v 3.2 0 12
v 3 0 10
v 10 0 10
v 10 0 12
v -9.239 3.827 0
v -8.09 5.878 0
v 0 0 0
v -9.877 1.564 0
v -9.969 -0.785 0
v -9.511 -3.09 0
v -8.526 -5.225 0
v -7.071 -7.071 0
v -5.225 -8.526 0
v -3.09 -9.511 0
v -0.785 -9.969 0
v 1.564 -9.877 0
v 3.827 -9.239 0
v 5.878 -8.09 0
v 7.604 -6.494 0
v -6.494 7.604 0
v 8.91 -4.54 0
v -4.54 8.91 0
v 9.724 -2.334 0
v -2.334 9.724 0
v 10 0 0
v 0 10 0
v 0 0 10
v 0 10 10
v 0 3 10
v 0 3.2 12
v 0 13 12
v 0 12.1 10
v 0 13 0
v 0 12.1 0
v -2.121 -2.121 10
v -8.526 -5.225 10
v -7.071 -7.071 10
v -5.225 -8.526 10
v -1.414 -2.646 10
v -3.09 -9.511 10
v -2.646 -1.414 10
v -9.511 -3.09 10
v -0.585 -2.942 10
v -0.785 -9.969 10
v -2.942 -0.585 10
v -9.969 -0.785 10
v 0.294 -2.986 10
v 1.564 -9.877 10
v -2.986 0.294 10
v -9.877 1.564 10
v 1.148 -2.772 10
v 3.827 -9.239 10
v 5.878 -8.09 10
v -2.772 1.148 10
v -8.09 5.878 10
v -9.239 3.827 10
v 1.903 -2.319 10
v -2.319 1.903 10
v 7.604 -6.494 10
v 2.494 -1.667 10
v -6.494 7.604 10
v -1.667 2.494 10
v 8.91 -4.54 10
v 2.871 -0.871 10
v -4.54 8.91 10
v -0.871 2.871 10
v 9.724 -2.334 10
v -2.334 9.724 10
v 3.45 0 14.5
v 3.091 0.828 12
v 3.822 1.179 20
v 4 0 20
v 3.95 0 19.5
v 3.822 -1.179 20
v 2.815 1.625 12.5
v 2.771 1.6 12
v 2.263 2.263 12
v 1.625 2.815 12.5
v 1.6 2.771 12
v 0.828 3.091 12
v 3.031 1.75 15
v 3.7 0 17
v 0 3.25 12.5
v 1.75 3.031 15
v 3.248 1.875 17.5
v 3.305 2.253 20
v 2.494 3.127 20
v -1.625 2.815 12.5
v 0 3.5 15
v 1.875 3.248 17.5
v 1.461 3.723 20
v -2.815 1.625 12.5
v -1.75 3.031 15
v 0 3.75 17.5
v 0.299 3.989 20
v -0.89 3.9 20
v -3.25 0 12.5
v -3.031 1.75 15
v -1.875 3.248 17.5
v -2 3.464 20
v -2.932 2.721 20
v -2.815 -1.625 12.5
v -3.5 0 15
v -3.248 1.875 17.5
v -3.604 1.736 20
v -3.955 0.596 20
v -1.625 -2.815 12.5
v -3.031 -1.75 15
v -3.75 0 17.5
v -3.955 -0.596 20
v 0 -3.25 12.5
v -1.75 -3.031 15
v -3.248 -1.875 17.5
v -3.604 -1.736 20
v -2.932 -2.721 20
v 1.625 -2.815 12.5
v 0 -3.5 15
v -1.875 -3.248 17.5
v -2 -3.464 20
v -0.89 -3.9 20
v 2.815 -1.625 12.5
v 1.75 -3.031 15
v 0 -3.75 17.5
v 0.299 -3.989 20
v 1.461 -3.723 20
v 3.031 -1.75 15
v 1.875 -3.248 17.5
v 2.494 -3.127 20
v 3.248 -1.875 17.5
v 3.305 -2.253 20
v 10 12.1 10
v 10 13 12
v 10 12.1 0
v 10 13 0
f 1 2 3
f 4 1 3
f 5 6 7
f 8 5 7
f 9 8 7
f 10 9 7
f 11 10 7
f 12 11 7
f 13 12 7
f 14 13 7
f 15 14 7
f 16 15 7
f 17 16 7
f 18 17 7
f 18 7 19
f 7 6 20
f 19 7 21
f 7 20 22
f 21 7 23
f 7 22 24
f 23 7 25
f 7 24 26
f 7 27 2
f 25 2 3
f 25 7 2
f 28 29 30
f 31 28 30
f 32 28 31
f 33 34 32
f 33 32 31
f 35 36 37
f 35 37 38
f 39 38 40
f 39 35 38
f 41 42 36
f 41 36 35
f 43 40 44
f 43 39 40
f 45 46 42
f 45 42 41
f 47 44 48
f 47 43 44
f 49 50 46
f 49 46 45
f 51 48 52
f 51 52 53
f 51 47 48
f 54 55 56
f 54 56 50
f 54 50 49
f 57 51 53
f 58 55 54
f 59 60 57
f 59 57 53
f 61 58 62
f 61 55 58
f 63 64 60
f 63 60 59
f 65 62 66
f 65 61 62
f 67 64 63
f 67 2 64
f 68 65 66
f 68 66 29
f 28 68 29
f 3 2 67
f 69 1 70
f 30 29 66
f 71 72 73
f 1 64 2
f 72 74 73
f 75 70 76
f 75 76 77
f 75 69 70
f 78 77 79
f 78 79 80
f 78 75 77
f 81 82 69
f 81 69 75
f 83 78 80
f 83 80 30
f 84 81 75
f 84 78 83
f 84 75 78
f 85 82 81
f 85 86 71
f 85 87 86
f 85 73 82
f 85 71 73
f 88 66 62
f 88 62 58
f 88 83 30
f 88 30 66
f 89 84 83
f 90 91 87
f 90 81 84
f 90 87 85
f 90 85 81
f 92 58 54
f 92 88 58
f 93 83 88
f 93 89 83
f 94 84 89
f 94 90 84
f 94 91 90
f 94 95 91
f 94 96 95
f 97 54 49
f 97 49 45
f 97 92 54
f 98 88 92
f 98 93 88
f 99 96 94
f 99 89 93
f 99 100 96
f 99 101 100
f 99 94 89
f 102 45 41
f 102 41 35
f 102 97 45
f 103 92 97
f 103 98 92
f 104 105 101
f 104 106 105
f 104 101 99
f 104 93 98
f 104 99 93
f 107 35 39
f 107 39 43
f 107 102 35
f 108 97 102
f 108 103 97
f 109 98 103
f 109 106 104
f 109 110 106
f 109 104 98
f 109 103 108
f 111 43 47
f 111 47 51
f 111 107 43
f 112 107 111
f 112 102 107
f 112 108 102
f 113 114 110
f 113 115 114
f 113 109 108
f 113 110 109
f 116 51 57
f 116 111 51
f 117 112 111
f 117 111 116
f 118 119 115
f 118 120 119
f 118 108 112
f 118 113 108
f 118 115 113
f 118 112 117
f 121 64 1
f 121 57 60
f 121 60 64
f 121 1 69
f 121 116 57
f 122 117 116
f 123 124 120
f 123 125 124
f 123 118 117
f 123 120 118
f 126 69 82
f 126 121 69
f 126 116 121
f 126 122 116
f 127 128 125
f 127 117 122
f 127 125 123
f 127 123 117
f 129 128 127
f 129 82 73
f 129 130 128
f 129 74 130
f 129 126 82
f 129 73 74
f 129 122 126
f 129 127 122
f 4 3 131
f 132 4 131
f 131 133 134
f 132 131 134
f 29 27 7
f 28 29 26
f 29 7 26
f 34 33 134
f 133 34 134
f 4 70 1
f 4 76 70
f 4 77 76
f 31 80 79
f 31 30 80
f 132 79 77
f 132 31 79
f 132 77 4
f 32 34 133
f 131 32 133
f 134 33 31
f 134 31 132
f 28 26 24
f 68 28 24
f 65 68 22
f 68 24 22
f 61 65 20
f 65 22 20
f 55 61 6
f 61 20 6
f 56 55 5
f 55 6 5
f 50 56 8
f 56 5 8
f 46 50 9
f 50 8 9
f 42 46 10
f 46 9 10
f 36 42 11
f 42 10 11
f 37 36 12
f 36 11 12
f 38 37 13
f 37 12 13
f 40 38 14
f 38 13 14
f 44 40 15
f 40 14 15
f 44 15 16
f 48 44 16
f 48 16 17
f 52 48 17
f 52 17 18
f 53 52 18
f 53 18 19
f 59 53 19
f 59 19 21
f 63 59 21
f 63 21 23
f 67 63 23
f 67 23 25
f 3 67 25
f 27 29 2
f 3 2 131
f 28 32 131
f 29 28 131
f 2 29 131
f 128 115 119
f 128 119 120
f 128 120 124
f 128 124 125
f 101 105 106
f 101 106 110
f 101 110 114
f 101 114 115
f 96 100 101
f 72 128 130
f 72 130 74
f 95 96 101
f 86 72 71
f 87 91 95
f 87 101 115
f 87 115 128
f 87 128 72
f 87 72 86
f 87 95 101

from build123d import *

# Parameters (mm, degrees)
CYLINDER_R     = 10
CYLINDER_DEPTH = 10
BOX_W          = 10
BOX_H          = 13
BOX_DEPTH      = 12
BOX001_W       = 10.1
BOX001_H       = 12.1
BOX001_DEPTH   = 10


with BuildPart() as part:
    # Cone → Cone (revolve)
    with BuildSketch(Plane.XZ):
        Polygon((0, 0), (2, 0), (4, 20), (0, 20), align=None)
    revolve(axis=Axis((0, 0, 0), (0, 0, 1)))

    # Cylinder → Cylinder (join)
    with BuildSketch(Plane.XY):
        Circle(CYLINDER_R)
    extrude(amount=CYLINDER_DEPTH)

    # Box → Box (join)
    with BuildSketch(Plane.XY):
        with Locations((5, 6.5)):
            Rectangle(BOX_W, BOX_H)
    extrude(amount=BOX_DEPTH)

    # Box001 → Box001 (cut)
    with BuildSketch(Plane.XY):
        with Locations((5.05, 6.05)):
            Rectangle(BOX001_W, BOX001_H)
    extrude(amount=BOX001_DEPTH, mode=Mode.SUBTRACT)


solid = part.part
